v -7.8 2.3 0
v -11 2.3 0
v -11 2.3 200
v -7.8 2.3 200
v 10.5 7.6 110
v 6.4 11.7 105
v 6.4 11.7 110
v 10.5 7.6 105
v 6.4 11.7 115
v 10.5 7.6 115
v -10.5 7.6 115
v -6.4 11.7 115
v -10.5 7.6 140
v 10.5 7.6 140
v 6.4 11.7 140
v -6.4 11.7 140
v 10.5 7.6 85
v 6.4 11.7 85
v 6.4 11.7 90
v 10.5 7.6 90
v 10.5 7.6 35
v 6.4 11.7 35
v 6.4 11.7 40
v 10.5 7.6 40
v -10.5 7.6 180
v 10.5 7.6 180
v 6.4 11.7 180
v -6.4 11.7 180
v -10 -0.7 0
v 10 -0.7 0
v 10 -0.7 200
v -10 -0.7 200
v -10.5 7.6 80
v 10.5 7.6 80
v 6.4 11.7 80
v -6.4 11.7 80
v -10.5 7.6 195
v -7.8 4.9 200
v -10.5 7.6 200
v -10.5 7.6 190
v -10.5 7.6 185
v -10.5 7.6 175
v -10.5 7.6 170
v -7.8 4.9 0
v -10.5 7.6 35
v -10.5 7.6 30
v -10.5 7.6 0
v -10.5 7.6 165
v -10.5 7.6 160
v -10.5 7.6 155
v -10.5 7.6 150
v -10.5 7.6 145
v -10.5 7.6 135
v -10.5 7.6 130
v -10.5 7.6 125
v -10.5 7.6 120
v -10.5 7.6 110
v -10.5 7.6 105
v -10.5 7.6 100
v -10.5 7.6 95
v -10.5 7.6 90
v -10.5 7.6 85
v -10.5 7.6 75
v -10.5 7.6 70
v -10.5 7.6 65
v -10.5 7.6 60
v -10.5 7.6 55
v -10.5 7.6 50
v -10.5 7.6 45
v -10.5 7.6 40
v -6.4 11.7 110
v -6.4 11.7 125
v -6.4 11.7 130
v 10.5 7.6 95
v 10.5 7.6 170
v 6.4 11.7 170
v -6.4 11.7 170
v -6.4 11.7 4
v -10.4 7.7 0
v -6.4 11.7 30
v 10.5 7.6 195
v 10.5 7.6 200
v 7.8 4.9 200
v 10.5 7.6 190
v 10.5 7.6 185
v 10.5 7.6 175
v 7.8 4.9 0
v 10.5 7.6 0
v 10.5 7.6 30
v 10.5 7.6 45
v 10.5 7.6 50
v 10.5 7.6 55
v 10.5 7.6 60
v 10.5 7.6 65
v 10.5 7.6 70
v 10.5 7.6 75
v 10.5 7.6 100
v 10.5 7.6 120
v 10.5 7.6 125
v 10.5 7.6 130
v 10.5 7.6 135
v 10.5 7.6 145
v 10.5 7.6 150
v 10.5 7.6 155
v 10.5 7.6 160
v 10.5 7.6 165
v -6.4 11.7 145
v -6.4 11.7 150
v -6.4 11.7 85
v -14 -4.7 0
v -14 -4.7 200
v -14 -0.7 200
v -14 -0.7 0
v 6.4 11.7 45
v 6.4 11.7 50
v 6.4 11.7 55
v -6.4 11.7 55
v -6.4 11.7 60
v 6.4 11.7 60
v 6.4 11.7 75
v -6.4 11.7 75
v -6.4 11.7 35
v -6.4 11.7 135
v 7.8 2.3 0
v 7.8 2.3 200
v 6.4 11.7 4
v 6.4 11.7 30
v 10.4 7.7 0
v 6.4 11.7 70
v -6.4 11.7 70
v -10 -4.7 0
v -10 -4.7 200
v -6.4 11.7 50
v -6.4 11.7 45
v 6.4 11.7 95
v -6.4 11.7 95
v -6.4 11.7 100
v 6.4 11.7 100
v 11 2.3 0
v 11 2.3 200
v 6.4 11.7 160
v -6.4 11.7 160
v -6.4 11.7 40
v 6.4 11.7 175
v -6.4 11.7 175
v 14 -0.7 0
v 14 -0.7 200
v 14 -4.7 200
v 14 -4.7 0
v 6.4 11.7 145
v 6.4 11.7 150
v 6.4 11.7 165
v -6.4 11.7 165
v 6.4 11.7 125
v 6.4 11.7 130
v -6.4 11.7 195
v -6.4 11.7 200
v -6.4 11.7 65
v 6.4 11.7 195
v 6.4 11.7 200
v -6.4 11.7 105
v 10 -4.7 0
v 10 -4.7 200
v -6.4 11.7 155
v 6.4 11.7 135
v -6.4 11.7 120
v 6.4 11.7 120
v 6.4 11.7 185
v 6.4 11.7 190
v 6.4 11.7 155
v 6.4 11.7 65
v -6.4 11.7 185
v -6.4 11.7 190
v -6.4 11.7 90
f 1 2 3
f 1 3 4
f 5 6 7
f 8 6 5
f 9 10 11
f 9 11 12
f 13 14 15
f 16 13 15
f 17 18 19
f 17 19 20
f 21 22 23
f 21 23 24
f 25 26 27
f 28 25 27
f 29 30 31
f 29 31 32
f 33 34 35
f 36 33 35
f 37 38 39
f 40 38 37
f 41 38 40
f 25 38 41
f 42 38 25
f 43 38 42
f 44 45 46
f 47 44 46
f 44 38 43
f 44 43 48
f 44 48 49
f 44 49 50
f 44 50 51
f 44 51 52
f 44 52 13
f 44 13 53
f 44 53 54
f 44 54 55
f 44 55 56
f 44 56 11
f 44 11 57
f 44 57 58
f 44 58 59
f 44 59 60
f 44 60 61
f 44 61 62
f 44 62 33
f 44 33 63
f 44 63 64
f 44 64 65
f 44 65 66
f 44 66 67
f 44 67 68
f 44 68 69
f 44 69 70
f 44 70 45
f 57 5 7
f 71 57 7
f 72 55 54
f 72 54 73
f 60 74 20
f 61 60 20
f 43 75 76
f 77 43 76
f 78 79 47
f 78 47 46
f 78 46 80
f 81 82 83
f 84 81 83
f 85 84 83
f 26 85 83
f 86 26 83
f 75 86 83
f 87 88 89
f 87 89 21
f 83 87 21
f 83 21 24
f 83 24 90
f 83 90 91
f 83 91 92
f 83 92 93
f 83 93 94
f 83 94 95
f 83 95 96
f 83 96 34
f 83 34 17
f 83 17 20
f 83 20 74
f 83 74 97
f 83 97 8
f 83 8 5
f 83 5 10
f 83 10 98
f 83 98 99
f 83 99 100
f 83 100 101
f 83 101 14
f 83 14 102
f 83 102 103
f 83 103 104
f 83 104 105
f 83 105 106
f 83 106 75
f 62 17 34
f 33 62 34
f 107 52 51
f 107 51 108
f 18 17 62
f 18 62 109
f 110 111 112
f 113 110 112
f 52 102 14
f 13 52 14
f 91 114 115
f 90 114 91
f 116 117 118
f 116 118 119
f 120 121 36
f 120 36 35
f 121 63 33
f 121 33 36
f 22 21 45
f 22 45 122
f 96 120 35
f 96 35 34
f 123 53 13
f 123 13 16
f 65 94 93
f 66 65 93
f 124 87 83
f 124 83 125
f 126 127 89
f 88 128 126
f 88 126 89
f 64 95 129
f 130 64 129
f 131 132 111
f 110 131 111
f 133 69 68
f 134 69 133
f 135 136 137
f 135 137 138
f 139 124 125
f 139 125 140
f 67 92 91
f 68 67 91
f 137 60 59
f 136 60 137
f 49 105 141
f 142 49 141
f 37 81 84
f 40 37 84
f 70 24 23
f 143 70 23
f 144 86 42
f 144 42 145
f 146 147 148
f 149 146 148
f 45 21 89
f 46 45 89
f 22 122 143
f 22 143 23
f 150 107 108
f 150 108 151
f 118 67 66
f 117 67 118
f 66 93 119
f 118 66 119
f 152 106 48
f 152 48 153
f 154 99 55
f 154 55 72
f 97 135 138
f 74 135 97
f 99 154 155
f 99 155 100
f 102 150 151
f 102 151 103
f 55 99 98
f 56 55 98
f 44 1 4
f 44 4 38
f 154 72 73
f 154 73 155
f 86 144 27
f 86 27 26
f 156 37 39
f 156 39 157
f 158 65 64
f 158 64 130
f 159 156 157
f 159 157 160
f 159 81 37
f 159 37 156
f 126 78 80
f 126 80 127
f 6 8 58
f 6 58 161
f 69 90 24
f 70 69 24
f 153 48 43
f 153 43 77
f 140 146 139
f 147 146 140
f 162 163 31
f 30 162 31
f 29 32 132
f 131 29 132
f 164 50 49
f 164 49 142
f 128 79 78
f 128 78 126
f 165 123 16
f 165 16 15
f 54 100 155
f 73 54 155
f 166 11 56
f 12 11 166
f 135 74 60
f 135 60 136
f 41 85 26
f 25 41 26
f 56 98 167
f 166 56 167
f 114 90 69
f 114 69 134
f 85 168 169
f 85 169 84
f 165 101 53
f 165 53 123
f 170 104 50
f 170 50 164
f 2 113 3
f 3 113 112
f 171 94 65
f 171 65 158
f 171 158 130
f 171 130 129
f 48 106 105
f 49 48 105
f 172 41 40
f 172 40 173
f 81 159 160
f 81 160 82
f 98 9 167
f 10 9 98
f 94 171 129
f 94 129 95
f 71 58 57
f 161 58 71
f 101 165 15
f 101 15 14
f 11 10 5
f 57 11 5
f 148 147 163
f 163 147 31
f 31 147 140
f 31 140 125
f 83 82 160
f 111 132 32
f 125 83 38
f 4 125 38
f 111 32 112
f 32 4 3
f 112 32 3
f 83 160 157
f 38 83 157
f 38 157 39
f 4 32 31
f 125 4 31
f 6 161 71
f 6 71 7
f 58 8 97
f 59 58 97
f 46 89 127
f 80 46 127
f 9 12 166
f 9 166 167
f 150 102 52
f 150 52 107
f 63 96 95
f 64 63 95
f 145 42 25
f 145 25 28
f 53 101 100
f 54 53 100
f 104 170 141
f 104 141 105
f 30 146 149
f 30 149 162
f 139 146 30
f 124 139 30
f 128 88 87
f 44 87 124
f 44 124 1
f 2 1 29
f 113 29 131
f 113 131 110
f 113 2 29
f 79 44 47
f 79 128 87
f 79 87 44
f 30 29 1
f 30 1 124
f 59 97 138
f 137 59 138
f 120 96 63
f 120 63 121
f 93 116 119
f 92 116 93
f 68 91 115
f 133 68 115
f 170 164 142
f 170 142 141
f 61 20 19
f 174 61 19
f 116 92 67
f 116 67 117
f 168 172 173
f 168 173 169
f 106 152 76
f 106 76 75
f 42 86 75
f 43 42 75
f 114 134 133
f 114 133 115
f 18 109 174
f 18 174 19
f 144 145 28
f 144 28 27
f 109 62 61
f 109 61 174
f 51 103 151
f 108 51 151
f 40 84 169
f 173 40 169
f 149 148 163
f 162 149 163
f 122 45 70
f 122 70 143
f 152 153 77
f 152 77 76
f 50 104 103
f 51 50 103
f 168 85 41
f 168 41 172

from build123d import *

# Parameters (mm, degrees)
BOSS_EXTRUDE1_DEPTH = 200
CHAMFER1_SIZE       = 3
SKETCH2_W           = 5
SKETCH2_H           = 4.1
CUT_EXTRUDE1_DEPTH  = 200
LPATTERN1_COUNT     = 20
LPATTERN1_PITCH     = 10
BOSS_EXTRUDE2_DEPTH = 25
CHAMFER2_SIZE       = 4


with BuildPart() as part:
    # Sketch1 → Boss-Extrude1 (new body)
    with BuildSketch(Plane.XY):
        Polygon((-14, 2.3), (-7.8, 2.3), (-7.8, 4.9), (-10.5, 7.6), (-6.4, 11.7), (6.4, 11.7), (10.5, 7.6), (7.8, 4.9), (7.8, 2.3), (14, 2.3), (14, -4.7), (10, -4.7), (10, -0.7), (-10, -0.7), (-10, -4.7), (-14, -4.7), align=None)
    extrude(amount=BOSS_EXTRUDE1_DEPTH)

    # Chamfer1
    chamfer1_edges = [part.edges().sort_by_distance(p)[0] for p in [
        (-14, 2.3, 100),
        (14, 2.3, 100),
    ]]
    chamfer(chamfer1_edges, length=CHAMFER1_SIZE)

    # Sketch2 → Cut-Extrude1 (cut, symmetric)
    with BuildSketch(Plane(origin=(0, 0, 0), x_dir=(0, 0, -1), z_dir=(1, 0, 0))):
        with Locations((-192.5, 9.65)):
            Rectangle(SKETCH2_W, SKETCH2_H)
    cut_extrude1 = extrude(amount=CUT_EXTRUDE1_DEPTH, both=True, mode=Mode.SUBTRACT)

    # LPattern1: Cut-Extrude1 ×20
    with Locations(*[(0, 0, -i * LPATTERN1_PITCH) for i in range(1, LPATTERN1_COUNT)]):
        add(cut_extrude1, mode=Mode.SUBTRACT)

    # Sketch4 → Boss-Extrude2 (add)
    with BuildSketch(Plane(origin=(0, 0, 25), x_dir=(-1, 0, 0), z_dir=(0, 0, -1))):
        Polygon((-10.5, 7.6), (10.5, 7.6), (6.4, 11.7), (-6.4, 11.7), align=None)
    extrude(amount=BOSS_EXTRUDE2_DEPTH)

    # Chamfer2
    chamfer2_edges = [part.edges().sort_by_distance(p)[0] for p in [
        (0, 11.7, 0),
    ]]
    chamfer(chamfer2_edges, length=CHAMFER2_SIZE)


solid = part.part
